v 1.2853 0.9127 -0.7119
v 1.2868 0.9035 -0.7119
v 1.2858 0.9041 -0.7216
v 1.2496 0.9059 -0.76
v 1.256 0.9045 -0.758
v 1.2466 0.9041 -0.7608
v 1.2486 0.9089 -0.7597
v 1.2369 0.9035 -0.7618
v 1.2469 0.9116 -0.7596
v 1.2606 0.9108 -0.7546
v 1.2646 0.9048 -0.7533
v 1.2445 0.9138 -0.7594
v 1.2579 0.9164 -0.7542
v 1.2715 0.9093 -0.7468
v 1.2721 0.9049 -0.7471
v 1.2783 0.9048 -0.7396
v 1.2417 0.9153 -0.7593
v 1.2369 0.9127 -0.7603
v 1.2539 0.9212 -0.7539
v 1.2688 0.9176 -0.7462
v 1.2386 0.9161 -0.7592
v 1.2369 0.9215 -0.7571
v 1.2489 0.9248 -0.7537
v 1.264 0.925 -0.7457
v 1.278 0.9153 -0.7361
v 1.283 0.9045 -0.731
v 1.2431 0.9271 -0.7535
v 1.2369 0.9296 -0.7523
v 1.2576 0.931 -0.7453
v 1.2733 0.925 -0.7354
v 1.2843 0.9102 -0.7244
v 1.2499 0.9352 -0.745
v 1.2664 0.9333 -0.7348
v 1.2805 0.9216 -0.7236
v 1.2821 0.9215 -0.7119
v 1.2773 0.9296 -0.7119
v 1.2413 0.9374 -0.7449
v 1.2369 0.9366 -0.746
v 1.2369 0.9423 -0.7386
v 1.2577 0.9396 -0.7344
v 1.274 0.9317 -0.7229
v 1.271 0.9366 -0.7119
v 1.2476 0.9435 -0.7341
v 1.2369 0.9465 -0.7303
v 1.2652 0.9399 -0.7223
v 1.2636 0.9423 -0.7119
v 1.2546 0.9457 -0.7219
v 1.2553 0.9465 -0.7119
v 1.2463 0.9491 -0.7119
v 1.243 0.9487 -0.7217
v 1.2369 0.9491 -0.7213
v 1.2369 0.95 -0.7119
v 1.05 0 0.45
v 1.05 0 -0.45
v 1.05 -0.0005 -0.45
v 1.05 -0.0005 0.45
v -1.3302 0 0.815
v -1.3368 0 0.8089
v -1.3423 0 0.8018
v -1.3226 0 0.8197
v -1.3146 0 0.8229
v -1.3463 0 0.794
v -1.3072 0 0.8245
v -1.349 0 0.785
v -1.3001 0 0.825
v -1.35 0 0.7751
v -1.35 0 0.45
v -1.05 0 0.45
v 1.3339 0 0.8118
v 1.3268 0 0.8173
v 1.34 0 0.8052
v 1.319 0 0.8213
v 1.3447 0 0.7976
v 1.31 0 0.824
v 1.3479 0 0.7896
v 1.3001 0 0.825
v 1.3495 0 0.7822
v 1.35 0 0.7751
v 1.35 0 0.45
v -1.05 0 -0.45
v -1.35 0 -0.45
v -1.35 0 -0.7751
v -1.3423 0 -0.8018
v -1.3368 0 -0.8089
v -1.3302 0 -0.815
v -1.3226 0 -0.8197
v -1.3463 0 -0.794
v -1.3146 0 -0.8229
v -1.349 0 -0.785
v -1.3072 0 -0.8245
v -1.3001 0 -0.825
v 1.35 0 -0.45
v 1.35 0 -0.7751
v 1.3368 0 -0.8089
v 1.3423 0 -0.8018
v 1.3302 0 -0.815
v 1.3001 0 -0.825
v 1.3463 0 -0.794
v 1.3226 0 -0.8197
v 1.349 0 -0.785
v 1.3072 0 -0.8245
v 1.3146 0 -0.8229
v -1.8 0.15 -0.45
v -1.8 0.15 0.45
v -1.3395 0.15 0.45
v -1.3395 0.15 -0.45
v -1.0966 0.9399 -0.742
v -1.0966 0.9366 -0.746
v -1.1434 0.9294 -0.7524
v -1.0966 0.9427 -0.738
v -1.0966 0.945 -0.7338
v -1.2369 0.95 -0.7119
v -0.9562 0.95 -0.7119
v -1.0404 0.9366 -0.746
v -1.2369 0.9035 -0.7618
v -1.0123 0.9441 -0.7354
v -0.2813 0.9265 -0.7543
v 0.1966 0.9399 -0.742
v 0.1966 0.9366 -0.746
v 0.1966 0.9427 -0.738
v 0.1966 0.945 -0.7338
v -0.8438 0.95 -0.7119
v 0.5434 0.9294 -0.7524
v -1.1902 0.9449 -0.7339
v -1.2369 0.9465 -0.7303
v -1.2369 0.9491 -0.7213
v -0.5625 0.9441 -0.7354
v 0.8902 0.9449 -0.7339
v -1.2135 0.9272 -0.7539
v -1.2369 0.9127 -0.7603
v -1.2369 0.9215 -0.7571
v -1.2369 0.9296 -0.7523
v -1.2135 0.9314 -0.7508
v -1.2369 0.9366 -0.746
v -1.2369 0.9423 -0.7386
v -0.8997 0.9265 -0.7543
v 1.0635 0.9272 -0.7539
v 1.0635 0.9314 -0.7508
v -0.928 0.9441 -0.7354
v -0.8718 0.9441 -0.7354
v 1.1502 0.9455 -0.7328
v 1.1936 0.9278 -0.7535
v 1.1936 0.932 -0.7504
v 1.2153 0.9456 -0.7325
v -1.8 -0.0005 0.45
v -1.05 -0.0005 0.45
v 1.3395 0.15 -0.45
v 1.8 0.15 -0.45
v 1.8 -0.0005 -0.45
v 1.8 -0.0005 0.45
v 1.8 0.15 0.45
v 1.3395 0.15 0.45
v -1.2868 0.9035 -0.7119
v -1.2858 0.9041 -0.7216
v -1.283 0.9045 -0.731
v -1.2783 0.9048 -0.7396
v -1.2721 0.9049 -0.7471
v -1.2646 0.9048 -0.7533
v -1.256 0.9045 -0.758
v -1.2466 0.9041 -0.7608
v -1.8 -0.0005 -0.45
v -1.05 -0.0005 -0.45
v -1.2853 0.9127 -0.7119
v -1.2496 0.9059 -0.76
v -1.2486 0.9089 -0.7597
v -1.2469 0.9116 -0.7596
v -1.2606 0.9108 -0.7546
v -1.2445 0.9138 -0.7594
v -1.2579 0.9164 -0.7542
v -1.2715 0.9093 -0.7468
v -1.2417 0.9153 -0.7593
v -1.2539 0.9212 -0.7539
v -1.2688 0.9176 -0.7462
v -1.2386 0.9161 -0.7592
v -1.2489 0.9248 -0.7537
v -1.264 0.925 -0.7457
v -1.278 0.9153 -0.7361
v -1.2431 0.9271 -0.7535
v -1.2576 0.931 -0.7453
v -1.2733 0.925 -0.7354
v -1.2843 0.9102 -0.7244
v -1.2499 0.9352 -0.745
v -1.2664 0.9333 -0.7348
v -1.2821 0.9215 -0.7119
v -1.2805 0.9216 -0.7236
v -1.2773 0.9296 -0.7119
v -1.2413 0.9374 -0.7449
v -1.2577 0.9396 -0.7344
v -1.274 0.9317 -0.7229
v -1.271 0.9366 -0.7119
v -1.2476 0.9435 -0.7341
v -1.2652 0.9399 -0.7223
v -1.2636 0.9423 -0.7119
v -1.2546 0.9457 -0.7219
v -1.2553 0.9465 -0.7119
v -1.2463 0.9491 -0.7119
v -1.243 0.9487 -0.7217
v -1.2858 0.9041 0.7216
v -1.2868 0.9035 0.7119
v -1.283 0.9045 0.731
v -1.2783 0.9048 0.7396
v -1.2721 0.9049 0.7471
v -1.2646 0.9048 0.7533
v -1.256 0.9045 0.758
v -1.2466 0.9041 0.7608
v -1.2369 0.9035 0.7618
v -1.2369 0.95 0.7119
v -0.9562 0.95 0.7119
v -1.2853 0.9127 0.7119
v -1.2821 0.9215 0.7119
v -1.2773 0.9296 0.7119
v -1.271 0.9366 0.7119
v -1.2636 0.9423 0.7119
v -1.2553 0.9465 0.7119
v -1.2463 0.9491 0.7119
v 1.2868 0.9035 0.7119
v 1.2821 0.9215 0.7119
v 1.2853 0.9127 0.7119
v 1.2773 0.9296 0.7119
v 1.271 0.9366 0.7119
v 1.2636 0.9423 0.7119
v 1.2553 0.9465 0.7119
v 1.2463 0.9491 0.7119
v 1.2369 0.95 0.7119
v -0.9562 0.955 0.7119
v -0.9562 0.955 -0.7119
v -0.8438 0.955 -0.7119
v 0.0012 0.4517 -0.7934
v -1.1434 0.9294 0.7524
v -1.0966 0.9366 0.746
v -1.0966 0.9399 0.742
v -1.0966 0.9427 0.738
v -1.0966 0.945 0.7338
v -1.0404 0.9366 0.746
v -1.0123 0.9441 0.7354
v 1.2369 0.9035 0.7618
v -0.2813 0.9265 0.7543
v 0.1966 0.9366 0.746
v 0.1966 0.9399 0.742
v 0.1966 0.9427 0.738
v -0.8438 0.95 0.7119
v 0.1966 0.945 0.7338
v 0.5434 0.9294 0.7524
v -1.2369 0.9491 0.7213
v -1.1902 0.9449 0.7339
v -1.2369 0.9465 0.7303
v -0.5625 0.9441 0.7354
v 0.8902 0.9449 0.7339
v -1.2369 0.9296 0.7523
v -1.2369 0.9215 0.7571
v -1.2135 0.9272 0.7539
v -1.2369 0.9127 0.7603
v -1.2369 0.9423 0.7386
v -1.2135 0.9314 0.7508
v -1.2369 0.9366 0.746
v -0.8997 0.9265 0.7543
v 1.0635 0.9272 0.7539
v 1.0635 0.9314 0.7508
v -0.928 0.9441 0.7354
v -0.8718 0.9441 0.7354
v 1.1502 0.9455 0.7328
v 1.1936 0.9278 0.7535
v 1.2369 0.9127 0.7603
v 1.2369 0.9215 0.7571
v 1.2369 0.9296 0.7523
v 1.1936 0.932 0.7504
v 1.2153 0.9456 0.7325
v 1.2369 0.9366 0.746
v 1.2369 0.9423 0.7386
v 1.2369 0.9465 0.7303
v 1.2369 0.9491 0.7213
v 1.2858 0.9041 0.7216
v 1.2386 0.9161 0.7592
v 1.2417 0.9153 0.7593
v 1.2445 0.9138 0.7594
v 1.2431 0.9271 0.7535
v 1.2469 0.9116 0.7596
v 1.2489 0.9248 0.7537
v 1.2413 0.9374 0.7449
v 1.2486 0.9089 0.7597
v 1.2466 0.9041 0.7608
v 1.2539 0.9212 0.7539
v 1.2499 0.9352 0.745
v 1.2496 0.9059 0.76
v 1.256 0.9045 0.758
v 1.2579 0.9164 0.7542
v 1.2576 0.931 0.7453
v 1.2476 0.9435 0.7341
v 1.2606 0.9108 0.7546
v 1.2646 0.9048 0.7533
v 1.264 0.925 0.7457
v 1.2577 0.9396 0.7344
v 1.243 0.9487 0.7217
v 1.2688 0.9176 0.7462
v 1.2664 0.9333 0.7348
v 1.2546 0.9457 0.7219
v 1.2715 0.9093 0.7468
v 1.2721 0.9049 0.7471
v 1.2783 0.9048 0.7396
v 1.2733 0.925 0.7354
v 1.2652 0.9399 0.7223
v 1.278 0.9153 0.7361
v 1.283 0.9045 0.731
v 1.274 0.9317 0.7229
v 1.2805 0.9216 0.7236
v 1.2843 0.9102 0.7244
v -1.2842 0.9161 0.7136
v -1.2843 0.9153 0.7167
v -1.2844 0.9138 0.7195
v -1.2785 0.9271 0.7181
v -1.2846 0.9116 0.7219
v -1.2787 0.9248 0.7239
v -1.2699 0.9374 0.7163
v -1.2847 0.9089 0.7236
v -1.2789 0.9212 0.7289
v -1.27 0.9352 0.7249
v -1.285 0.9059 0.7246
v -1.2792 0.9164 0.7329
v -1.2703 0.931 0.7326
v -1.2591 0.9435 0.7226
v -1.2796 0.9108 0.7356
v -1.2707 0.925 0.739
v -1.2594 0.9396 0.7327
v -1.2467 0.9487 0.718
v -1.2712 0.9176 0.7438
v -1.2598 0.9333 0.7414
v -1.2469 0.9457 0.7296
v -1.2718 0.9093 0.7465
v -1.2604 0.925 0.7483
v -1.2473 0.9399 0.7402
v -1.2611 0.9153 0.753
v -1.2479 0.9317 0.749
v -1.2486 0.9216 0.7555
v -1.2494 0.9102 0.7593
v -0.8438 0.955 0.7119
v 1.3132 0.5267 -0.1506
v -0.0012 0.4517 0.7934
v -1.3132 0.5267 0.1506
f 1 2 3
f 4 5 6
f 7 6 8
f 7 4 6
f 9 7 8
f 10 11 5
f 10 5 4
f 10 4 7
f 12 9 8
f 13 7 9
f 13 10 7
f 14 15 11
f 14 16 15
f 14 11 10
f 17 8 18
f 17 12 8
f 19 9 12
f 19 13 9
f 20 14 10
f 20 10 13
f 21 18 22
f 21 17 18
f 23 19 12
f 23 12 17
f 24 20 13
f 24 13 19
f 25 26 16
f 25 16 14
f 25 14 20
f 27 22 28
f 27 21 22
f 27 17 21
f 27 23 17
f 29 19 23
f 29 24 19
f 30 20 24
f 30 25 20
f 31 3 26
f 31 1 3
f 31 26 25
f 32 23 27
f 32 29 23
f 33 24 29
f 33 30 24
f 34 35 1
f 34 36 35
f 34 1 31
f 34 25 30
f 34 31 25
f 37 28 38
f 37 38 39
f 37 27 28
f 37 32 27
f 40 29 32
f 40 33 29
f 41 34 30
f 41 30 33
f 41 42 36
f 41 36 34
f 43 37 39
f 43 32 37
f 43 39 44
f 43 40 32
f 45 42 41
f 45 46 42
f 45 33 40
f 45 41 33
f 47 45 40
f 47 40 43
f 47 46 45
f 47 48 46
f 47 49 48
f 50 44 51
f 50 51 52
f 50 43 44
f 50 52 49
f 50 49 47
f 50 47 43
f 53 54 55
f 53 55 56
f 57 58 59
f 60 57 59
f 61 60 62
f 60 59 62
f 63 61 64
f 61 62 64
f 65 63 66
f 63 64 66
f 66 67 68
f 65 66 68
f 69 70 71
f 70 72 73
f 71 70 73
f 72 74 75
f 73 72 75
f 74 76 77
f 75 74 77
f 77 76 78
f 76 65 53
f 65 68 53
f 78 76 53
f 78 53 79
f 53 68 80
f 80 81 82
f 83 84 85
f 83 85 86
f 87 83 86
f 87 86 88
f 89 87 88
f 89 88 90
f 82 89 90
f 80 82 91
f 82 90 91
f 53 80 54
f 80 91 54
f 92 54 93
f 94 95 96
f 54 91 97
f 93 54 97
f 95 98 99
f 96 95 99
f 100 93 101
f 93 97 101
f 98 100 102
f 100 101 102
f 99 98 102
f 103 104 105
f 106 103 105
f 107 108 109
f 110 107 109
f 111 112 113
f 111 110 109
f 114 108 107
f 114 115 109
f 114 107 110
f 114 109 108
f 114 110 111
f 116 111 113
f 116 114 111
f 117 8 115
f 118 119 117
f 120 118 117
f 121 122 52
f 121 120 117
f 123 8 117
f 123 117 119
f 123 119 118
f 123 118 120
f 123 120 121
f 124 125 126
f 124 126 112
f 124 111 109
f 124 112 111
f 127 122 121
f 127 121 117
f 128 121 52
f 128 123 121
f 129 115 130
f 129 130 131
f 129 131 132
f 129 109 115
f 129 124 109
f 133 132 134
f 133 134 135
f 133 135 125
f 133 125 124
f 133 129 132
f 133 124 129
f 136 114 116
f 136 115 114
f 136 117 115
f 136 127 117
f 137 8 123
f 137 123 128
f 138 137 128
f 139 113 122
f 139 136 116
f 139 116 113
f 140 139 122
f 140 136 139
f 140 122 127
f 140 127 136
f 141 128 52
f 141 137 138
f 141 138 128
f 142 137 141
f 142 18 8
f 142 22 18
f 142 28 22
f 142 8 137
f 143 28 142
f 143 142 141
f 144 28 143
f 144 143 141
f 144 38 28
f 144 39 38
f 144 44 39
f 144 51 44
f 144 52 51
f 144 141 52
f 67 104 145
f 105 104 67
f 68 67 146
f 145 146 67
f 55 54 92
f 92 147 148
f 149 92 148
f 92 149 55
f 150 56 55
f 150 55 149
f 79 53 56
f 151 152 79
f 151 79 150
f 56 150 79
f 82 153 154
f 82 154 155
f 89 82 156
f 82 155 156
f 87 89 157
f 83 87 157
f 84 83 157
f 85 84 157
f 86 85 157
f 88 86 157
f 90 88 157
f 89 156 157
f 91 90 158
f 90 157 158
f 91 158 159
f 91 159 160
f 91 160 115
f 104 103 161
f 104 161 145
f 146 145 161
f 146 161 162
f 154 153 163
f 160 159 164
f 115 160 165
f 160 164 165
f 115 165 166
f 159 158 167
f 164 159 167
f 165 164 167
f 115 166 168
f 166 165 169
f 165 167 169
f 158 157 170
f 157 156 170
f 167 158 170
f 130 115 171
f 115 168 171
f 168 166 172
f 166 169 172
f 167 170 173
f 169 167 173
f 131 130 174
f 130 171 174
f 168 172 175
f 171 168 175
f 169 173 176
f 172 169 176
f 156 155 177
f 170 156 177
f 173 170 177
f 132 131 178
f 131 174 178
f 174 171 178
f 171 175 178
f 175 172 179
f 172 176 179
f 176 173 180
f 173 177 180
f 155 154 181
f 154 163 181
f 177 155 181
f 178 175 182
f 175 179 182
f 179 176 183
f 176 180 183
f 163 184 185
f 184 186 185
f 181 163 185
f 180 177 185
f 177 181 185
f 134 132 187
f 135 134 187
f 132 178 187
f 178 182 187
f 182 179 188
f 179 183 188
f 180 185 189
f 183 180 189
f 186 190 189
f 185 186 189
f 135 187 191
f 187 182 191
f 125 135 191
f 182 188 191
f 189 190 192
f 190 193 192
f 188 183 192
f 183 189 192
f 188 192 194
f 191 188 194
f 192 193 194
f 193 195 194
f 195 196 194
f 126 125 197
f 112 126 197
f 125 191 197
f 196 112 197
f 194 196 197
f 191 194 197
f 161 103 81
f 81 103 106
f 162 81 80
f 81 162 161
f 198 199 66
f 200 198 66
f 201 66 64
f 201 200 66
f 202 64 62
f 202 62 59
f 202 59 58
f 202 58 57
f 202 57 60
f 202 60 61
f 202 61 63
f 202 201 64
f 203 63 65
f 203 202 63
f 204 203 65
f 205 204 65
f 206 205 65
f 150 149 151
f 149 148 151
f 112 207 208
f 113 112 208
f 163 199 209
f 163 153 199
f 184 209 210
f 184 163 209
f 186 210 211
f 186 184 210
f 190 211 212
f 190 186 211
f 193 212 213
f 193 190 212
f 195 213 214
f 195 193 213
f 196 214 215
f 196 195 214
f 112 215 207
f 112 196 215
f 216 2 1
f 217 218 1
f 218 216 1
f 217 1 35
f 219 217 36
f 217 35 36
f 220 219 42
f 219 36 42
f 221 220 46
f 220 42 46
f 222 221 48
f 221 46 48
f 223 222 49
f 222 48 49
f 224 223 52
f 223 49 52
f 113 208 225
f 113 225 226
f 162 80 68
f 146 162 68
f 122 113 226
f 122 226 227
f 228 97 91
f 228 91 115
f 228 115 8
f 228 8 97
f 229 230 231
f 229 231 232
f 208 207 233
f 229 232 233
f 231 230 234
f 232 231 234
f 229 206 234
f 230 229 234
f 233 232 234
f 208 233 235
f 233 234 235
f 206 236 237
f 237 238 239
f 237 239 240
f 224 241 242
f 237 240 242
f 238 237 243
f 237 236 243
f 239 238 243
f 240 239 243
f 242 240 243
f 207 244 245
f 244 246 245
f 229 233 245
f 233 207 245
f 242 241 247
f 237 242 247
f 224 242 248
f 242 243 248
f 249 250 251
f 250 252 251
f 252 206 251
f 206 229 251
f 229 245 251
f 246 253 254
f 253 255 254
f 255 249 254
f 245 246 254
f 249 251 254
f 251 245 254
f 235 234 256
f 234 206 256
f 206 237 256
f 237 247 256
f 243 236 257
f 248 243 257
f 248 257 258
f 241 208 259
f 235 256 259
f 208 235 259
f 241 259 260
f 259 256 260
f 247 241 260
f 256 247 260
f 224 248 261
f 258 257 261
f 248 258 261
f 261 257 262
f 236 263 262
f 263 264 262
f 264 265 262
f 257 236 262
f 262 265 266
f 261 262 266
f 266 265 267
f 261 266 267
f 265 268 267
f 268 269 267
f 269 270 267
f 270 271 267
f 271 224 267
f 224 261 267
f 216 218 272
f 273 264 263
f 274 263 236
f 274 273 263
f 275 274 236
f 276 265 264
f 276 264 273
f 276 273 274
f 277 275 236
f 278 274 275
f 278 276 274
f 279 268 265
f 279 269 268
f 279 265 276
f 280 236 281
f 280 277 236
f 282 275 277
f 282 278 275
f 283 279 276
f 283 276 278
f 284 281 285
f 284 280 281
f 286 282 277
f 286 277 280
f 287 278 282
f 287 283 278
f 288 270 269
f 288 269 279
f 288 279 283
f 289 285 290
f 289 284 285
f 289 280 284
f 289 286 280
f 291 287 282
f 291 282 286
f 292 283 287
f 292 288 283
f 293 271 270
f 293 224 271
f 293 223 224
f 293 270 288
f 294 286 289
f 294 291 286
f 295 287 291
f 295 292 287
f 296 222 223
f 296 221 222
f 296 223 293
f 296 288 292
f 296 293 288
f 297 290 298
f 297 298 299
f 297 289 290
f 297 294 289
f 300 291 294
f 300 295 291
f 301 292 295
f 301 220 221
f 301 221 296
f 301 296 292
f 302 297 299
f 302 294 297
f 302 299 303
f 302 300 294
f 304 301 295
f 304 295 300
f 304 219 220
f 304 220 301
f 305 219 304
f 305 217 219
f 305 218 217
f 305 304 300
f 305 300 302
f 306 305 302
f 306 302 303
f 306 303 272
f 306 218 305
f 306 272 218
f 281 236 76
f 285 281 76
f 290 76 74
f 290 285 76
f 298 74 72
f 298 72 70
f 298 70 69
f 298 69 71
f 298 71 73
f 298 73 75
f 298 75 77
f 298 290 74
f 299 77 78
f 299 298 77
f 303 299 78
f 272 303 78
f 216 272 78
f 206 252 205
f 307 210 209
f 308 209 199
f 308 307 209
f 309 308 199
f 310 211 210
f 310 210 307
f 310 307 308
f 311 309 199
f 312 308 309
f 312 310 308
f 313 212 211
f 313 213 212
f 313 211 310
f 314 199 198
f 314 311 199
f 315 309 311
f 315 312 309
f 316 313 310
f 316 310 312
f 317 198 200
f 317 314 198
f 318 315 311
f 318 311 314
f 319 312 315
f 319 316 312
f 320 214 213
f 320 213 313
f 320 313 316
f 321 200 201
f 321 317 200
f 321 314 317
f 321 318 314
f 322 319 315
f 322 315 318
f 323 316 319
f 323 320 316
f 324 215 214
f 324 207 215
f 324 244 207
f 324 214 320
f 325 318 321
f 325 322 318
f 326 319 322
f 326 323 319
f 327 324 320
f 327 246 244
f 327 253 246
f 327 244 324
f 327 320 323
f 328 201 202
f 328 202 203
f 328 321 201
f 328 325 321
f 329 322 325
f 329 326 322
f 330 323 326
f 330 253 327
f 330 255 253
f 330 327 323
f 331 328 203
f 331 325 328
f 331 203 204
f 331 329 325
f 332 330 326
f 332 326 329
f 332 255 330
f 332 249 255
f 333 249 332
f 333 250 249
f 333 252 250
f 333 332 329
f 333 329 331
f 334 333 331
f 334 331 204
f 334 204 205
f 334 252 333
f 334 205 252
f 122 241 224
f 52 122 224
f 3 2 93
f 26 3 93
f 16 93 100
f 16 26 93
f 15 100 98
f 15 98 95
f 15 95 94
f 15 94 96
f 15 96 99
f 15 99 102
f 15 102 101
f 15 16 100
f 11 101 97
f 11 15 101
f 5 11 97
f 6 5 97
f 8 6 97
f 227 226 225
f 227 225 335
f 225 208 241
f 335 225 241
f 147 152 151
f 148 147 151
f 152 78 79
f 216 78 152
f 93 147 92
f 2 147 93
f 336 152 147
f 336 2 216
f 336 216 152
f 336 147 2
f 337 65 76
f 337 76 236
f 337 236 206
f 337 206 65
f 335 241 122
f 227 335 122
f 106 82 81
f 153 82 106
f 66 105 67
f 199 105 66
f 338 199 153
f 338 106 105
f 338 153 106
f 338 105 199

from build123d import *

# Parameters (mm, degrees)
SKETCH2_W           = 2.7
SKETCH2_H           = 1.65
BOSS_EXTRUDE1_DEPTH = 0.95
BOSS_EXTRUDE1_TAPER = 4
FILLET1_R           = 0.05
SKETCH3_W           = 0.75
SKETCH3_H           = 0.9
BOSS_EXTRUDE2_DEPTH = 0.15
SKETCH4_W           = 0.11236269
SKETCH4_H           = 1.423887548
BOSS_EXTRUDE3_DEPTH = 0.005
SKETCH3_2_W         = 0.75
SKETCH3_2_H         = 0.9
BOSS_EXTRUDE4_DEPTH = 0.0005


with BuildPart() as part:
    # Sketch2 → Boss-Extrude1 (new body)
    with BuildSketch(Plane(origin=(0, 0, 0), x_dir=(1, 0, 0), z_dir=(0, 1, 0))):
        Rectangle(SKETCH2_W, SKETCH2_H)
    extrude(amount=BOSS_EXTRUDE1_DEPTH, taper=BOSS_EXTRUDE1_TAPER)

    # Fillet1
    fillet1_edges = [part.edges().sort_by_distance(p)[0] for p in [
        (1.283569529, 0.95, 0),
        (0, 0.95, 0.758569529),
        (-1.283569529, 0.95, 0),
        (-1.316784764, 0.475, 0.791784764),
        (1.316784764, 0.475, 0.791784764),
        (1.316784764, 0.475, -0.791784764),
        (-1.316784764, 0.475, -0.791784764),
        (0, 0.95, -0.758569529),
    ]]
    fillet(fillet1_edges, radius=FILLET1_R)

    # Sketch3 → Boss-Extrude2 (add)
    with BuildSketch(Plane.XZ):
        with Locations((1.425, 0)):
            Rectangle(SKETCH3_W, SKETCH3_H)
        with Locations((-1.425, 0)):
            Rectangle(SKETCH3_W, SKETCH3_H)
    extrude(amount=-BOSS_EXTRUDE2_DEPTH)

    # Sketch4 → Boss-Extrude3 (add)
    with BuildSketch(Plane(origin=(0, 0.95, 0), x_dir=(1, 0, 0), z_dir=(0, 1, 0))):
        with Locations((-0.9, 0)):
            Rectangle(SKETCH4_W, SKETCH4_H)
    extrude(amount=BOSS_EXTRUDE3_DEPTH)

    # Sketch3<2> → Boss-Extrude4 (add)
    with BuildSketch(Plane.XZ):
        with Locations((1.425, 0)):
            Rectangle(SKETCH3_2_W, SKETCH3_2_H)
        with Locations((-1.425, 0)):
            Rectangle(SKETCH3_2_W, SKETCH3_2_H)
    extrude(amount=BOSS_EXTRUDE4_DEPTH)


solid = part.part
